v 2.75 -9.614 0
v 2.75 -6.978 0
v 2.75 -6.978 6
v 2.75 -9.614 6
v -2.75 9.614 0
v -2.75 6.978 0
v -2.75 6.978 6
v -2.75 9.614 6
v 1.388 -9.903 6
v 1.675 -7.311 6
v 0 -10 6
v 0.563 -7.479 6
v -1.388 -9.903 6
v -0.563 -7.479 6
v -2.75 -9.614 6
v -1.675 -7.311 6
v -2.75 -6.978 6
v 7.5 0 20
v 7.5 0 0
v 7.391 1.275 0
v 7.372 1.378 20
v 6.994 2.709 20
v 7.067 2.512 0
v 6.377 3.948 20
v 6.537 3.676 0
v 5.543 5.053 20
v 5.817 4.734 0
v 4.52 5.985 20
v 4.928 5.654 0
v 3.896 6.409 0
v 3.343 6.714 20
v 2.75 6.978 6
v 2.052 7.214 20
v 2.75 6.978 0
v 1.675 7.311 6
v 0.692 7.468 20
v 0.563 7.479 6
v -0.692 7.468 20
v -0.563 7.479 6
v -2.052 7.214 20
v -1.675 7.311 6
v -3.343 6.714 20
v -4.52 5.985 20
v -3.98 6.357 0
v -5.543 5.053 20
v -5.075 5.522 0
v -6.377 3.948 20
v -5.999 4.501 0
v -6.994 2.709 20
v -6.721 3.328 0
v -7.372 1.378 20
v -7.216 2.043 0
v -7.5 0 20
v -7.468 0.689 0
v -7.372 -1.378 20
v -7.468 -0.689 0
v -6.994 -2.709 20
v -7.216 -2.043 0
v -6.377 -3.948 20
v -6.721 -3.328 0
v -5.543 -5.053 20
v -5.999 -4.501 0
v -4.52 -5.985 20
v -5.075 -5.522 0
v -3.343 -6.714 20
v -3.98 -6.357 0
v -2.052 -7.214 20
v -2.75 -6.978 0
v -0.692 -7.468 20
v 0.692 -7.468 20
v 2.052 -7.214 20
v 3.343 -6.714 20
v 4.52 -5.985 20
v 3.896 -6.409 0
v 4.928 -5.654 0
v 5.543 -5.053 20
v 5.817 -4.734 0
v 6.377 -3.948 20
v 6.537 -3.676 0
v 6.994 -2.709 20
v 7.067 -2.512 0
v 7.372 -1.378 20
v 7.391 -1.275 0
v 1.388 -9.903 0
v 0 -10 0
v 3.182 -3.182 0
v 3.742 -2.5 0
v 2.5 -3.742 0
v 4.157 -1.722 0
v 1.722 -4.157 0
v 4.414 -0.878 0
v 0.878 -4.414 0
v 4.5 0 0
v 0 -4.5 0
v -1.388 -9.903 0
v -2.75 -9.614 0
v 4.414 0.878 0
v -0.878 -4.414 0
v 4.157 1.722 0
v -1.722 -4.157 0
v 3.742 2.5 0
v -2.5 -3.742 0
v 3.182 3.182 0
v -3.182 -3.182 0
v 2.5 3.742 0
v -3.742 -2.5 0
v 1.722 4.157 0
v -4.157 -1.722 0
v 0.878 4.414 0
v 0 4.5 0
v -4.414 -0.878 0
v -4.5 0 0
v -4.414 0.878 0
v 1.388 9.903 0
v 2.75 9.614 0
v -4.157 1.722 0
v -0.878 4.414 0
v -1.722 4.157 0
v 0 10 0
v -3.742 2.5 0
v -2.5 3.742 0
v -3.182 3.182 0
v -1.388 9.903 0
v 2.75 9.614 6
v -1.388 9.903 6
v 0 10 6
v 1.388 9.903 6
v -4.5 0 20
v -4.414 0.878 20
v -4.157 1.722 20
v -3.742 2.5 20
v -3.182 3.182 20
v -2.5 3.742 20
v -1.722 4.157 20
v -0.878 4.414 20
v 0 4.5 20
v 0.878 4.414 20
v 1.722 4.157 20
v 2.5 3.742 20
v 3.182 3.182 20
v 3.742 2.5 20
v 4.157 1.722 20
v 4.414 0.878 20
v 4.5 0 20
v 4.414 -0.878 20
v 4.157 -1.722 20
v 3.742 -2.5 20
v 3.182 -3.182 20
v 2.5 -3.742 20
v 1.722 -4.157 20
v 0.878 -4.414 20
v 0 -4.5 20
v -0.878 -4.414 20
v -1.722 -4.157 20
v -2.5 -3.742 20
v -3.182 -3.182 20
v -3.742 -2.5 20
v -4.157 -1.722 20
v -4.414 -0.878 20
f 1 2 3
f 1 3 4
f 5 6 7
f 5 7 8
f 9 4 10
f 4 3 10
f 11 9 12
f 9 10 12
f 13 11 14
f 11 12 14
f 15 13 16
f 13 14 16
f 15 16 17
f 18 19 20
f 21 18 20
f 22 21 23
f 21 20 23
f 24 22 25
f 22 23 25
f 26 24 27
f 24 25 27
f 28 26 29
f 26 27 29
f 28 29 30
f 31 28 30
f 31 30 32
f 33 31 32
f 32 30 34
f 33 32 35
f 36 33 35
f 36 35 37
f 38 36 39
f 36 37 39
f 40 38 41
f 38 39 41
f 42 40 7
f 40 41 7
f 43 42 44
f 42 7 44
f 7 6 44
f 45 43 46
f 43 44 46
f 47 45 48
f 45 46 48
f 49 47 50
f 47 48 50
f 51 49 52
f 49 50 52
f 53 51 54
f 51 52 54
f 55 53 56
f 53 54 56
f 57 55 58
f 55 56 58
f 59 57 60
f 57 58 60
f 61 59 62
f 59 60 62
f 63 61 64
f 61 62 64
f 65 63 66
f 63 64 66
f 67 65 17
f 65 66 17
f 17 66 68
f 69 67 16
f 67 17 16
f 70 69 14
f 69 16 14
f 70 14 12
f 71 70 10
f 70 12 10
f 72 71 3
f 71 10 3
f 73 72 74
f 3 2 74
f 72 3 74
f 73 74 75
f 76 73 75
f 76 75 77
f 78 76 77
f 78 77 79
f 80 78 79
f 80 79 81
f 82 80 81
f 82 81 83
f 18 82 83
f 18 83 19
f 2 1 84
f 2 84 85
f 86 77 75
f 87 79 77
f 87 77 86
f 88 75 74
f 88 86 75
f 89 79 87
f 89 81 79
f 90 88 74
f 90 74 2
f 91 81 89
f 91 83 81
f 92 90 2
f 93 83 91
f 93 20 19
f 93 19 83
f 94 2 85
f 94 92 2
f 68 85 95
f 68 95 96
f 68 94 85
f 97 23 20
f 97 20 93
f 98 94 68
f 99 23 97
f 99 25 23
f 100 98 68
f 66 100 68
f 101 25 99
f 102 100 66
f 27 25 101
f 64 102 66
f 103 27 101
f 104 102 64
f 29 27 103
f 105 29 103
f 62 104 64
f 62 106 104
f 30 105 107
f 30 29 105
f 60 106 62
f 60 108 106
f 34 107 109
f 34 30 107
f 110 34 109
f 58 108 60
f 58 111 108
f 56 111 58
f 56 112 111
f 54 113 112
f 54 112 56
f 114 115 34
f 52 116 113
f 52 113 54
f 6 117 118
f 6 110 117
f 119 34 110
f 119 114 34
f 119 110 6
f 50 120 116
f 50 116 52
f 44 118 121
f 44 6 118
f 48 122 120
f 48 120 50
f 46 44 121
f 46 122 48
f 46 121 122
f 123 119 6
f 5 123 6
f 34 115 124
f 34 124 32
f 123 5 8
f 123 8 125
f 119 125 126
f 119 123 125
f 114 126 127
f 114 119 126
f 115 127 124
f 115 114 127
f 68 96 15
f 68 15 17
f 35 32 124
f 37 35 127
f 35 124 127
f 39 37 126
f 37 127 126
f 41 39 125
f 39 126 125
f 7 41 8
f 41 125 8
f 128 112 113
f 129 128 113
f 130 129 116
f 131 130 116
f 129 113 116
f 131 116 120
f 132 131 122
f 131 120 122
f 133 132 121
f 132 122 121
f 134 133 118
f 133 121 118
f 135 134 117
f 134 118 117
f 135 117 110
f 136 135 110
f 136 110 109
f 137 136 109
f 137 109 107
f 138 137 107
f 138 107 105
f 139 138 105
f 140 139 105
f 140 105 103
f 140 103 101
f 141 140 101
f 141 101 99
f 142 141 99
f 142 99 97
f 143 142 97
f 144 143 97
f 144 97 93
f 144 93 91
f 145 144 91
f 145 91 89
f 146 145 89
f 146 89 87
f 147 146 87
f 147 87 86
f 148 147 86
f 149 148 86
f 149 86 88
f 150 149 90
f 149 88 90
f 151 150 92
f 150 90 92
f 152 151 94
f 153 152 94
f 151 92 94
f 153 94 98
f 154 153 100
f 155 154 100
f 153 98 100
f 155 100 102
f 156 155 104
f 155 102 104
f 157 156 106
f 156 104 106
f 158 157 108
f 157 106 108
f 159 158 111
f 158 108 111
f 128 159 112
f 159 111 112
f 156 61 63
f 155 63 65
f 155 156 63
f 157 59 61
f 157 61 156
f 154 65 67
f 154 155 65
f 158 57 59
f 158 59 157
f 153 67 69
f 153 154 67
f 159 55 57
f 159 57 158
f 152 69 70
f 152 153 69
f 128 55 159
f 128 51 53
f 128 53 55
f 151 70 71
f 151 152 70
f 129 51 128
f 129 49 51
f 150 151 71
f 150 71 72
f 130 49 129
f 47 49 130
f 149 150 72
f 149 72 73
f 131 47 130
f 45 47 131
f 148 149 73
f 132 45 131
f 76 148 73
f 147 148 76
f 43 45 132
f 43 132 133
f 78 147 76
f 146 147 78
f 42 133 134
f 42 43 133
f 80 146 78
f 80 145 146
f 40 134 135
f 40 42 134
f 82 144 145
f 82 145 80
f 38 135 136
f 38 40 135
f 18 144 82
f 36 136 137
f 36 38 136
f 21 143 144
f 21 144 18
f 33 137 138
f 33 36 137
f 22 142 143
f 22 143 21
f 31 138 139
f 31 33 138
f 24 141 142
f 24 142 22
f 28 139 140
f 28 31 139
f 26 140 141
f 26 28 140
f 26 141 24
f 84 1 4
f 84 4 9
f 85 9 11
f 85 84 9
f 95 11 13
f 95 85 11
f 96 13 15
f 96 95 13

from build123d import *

# Parameters (mm, degrees)
SKETCH1_R           = 7.5
BOSS_EXTRUDE1_DEPTH = 20
BOSS_EXTRUDE2_DEPTH = 6
SKETCH3_R           = 4.5
CUT_EXTRUDE1_DEPTH  = 24.58495283


with BuildPart() as part:
    # Sketch1 → Boss-Extrude1 (new body)
    with BuildSketch(Plane.XY):
        Circle(SKETCH1_R)
    extrude(amount=BOSS_EXTRUDE1_DEPTH)

    # Sketch2 → Boss-Extrude2 (add)
    with BuildSketch(Plane(origin=(0, 0, 0), x_dir=(-1, 0, 0), z_dir=(0, 0, -1))):
        with BuildLine():
            Line((2.75, -9.614442262), (2.75, 9.614442262))
            ThreePointArc((2.75, 9.614442262), (0, 10), (-2.75, 9.614442262))
            Line((-2.75, 9.614442262), (-2.75, -9.614442262))
            ThreePointArc((-2.75, -9.614442262), (0, -10), (2.75, -9.614442262))
        make_face()
    extrude(amount=-BOSS_EXTRUDE2_DEPTH)

    # Sketch3 → Cut-Extrude1 (cut, through all)
    with BuildSketch(Plane(origin=(0, 0, 0), x_dir=(-1, 0, 0), z_dir=(0, 0, -1))):
        Circle(SKETCH3_R)
    extrude(amount=-CUT_EXTRUDE1_DEPTH, mode=Mode.SUBTRACT)


solid = part.part
